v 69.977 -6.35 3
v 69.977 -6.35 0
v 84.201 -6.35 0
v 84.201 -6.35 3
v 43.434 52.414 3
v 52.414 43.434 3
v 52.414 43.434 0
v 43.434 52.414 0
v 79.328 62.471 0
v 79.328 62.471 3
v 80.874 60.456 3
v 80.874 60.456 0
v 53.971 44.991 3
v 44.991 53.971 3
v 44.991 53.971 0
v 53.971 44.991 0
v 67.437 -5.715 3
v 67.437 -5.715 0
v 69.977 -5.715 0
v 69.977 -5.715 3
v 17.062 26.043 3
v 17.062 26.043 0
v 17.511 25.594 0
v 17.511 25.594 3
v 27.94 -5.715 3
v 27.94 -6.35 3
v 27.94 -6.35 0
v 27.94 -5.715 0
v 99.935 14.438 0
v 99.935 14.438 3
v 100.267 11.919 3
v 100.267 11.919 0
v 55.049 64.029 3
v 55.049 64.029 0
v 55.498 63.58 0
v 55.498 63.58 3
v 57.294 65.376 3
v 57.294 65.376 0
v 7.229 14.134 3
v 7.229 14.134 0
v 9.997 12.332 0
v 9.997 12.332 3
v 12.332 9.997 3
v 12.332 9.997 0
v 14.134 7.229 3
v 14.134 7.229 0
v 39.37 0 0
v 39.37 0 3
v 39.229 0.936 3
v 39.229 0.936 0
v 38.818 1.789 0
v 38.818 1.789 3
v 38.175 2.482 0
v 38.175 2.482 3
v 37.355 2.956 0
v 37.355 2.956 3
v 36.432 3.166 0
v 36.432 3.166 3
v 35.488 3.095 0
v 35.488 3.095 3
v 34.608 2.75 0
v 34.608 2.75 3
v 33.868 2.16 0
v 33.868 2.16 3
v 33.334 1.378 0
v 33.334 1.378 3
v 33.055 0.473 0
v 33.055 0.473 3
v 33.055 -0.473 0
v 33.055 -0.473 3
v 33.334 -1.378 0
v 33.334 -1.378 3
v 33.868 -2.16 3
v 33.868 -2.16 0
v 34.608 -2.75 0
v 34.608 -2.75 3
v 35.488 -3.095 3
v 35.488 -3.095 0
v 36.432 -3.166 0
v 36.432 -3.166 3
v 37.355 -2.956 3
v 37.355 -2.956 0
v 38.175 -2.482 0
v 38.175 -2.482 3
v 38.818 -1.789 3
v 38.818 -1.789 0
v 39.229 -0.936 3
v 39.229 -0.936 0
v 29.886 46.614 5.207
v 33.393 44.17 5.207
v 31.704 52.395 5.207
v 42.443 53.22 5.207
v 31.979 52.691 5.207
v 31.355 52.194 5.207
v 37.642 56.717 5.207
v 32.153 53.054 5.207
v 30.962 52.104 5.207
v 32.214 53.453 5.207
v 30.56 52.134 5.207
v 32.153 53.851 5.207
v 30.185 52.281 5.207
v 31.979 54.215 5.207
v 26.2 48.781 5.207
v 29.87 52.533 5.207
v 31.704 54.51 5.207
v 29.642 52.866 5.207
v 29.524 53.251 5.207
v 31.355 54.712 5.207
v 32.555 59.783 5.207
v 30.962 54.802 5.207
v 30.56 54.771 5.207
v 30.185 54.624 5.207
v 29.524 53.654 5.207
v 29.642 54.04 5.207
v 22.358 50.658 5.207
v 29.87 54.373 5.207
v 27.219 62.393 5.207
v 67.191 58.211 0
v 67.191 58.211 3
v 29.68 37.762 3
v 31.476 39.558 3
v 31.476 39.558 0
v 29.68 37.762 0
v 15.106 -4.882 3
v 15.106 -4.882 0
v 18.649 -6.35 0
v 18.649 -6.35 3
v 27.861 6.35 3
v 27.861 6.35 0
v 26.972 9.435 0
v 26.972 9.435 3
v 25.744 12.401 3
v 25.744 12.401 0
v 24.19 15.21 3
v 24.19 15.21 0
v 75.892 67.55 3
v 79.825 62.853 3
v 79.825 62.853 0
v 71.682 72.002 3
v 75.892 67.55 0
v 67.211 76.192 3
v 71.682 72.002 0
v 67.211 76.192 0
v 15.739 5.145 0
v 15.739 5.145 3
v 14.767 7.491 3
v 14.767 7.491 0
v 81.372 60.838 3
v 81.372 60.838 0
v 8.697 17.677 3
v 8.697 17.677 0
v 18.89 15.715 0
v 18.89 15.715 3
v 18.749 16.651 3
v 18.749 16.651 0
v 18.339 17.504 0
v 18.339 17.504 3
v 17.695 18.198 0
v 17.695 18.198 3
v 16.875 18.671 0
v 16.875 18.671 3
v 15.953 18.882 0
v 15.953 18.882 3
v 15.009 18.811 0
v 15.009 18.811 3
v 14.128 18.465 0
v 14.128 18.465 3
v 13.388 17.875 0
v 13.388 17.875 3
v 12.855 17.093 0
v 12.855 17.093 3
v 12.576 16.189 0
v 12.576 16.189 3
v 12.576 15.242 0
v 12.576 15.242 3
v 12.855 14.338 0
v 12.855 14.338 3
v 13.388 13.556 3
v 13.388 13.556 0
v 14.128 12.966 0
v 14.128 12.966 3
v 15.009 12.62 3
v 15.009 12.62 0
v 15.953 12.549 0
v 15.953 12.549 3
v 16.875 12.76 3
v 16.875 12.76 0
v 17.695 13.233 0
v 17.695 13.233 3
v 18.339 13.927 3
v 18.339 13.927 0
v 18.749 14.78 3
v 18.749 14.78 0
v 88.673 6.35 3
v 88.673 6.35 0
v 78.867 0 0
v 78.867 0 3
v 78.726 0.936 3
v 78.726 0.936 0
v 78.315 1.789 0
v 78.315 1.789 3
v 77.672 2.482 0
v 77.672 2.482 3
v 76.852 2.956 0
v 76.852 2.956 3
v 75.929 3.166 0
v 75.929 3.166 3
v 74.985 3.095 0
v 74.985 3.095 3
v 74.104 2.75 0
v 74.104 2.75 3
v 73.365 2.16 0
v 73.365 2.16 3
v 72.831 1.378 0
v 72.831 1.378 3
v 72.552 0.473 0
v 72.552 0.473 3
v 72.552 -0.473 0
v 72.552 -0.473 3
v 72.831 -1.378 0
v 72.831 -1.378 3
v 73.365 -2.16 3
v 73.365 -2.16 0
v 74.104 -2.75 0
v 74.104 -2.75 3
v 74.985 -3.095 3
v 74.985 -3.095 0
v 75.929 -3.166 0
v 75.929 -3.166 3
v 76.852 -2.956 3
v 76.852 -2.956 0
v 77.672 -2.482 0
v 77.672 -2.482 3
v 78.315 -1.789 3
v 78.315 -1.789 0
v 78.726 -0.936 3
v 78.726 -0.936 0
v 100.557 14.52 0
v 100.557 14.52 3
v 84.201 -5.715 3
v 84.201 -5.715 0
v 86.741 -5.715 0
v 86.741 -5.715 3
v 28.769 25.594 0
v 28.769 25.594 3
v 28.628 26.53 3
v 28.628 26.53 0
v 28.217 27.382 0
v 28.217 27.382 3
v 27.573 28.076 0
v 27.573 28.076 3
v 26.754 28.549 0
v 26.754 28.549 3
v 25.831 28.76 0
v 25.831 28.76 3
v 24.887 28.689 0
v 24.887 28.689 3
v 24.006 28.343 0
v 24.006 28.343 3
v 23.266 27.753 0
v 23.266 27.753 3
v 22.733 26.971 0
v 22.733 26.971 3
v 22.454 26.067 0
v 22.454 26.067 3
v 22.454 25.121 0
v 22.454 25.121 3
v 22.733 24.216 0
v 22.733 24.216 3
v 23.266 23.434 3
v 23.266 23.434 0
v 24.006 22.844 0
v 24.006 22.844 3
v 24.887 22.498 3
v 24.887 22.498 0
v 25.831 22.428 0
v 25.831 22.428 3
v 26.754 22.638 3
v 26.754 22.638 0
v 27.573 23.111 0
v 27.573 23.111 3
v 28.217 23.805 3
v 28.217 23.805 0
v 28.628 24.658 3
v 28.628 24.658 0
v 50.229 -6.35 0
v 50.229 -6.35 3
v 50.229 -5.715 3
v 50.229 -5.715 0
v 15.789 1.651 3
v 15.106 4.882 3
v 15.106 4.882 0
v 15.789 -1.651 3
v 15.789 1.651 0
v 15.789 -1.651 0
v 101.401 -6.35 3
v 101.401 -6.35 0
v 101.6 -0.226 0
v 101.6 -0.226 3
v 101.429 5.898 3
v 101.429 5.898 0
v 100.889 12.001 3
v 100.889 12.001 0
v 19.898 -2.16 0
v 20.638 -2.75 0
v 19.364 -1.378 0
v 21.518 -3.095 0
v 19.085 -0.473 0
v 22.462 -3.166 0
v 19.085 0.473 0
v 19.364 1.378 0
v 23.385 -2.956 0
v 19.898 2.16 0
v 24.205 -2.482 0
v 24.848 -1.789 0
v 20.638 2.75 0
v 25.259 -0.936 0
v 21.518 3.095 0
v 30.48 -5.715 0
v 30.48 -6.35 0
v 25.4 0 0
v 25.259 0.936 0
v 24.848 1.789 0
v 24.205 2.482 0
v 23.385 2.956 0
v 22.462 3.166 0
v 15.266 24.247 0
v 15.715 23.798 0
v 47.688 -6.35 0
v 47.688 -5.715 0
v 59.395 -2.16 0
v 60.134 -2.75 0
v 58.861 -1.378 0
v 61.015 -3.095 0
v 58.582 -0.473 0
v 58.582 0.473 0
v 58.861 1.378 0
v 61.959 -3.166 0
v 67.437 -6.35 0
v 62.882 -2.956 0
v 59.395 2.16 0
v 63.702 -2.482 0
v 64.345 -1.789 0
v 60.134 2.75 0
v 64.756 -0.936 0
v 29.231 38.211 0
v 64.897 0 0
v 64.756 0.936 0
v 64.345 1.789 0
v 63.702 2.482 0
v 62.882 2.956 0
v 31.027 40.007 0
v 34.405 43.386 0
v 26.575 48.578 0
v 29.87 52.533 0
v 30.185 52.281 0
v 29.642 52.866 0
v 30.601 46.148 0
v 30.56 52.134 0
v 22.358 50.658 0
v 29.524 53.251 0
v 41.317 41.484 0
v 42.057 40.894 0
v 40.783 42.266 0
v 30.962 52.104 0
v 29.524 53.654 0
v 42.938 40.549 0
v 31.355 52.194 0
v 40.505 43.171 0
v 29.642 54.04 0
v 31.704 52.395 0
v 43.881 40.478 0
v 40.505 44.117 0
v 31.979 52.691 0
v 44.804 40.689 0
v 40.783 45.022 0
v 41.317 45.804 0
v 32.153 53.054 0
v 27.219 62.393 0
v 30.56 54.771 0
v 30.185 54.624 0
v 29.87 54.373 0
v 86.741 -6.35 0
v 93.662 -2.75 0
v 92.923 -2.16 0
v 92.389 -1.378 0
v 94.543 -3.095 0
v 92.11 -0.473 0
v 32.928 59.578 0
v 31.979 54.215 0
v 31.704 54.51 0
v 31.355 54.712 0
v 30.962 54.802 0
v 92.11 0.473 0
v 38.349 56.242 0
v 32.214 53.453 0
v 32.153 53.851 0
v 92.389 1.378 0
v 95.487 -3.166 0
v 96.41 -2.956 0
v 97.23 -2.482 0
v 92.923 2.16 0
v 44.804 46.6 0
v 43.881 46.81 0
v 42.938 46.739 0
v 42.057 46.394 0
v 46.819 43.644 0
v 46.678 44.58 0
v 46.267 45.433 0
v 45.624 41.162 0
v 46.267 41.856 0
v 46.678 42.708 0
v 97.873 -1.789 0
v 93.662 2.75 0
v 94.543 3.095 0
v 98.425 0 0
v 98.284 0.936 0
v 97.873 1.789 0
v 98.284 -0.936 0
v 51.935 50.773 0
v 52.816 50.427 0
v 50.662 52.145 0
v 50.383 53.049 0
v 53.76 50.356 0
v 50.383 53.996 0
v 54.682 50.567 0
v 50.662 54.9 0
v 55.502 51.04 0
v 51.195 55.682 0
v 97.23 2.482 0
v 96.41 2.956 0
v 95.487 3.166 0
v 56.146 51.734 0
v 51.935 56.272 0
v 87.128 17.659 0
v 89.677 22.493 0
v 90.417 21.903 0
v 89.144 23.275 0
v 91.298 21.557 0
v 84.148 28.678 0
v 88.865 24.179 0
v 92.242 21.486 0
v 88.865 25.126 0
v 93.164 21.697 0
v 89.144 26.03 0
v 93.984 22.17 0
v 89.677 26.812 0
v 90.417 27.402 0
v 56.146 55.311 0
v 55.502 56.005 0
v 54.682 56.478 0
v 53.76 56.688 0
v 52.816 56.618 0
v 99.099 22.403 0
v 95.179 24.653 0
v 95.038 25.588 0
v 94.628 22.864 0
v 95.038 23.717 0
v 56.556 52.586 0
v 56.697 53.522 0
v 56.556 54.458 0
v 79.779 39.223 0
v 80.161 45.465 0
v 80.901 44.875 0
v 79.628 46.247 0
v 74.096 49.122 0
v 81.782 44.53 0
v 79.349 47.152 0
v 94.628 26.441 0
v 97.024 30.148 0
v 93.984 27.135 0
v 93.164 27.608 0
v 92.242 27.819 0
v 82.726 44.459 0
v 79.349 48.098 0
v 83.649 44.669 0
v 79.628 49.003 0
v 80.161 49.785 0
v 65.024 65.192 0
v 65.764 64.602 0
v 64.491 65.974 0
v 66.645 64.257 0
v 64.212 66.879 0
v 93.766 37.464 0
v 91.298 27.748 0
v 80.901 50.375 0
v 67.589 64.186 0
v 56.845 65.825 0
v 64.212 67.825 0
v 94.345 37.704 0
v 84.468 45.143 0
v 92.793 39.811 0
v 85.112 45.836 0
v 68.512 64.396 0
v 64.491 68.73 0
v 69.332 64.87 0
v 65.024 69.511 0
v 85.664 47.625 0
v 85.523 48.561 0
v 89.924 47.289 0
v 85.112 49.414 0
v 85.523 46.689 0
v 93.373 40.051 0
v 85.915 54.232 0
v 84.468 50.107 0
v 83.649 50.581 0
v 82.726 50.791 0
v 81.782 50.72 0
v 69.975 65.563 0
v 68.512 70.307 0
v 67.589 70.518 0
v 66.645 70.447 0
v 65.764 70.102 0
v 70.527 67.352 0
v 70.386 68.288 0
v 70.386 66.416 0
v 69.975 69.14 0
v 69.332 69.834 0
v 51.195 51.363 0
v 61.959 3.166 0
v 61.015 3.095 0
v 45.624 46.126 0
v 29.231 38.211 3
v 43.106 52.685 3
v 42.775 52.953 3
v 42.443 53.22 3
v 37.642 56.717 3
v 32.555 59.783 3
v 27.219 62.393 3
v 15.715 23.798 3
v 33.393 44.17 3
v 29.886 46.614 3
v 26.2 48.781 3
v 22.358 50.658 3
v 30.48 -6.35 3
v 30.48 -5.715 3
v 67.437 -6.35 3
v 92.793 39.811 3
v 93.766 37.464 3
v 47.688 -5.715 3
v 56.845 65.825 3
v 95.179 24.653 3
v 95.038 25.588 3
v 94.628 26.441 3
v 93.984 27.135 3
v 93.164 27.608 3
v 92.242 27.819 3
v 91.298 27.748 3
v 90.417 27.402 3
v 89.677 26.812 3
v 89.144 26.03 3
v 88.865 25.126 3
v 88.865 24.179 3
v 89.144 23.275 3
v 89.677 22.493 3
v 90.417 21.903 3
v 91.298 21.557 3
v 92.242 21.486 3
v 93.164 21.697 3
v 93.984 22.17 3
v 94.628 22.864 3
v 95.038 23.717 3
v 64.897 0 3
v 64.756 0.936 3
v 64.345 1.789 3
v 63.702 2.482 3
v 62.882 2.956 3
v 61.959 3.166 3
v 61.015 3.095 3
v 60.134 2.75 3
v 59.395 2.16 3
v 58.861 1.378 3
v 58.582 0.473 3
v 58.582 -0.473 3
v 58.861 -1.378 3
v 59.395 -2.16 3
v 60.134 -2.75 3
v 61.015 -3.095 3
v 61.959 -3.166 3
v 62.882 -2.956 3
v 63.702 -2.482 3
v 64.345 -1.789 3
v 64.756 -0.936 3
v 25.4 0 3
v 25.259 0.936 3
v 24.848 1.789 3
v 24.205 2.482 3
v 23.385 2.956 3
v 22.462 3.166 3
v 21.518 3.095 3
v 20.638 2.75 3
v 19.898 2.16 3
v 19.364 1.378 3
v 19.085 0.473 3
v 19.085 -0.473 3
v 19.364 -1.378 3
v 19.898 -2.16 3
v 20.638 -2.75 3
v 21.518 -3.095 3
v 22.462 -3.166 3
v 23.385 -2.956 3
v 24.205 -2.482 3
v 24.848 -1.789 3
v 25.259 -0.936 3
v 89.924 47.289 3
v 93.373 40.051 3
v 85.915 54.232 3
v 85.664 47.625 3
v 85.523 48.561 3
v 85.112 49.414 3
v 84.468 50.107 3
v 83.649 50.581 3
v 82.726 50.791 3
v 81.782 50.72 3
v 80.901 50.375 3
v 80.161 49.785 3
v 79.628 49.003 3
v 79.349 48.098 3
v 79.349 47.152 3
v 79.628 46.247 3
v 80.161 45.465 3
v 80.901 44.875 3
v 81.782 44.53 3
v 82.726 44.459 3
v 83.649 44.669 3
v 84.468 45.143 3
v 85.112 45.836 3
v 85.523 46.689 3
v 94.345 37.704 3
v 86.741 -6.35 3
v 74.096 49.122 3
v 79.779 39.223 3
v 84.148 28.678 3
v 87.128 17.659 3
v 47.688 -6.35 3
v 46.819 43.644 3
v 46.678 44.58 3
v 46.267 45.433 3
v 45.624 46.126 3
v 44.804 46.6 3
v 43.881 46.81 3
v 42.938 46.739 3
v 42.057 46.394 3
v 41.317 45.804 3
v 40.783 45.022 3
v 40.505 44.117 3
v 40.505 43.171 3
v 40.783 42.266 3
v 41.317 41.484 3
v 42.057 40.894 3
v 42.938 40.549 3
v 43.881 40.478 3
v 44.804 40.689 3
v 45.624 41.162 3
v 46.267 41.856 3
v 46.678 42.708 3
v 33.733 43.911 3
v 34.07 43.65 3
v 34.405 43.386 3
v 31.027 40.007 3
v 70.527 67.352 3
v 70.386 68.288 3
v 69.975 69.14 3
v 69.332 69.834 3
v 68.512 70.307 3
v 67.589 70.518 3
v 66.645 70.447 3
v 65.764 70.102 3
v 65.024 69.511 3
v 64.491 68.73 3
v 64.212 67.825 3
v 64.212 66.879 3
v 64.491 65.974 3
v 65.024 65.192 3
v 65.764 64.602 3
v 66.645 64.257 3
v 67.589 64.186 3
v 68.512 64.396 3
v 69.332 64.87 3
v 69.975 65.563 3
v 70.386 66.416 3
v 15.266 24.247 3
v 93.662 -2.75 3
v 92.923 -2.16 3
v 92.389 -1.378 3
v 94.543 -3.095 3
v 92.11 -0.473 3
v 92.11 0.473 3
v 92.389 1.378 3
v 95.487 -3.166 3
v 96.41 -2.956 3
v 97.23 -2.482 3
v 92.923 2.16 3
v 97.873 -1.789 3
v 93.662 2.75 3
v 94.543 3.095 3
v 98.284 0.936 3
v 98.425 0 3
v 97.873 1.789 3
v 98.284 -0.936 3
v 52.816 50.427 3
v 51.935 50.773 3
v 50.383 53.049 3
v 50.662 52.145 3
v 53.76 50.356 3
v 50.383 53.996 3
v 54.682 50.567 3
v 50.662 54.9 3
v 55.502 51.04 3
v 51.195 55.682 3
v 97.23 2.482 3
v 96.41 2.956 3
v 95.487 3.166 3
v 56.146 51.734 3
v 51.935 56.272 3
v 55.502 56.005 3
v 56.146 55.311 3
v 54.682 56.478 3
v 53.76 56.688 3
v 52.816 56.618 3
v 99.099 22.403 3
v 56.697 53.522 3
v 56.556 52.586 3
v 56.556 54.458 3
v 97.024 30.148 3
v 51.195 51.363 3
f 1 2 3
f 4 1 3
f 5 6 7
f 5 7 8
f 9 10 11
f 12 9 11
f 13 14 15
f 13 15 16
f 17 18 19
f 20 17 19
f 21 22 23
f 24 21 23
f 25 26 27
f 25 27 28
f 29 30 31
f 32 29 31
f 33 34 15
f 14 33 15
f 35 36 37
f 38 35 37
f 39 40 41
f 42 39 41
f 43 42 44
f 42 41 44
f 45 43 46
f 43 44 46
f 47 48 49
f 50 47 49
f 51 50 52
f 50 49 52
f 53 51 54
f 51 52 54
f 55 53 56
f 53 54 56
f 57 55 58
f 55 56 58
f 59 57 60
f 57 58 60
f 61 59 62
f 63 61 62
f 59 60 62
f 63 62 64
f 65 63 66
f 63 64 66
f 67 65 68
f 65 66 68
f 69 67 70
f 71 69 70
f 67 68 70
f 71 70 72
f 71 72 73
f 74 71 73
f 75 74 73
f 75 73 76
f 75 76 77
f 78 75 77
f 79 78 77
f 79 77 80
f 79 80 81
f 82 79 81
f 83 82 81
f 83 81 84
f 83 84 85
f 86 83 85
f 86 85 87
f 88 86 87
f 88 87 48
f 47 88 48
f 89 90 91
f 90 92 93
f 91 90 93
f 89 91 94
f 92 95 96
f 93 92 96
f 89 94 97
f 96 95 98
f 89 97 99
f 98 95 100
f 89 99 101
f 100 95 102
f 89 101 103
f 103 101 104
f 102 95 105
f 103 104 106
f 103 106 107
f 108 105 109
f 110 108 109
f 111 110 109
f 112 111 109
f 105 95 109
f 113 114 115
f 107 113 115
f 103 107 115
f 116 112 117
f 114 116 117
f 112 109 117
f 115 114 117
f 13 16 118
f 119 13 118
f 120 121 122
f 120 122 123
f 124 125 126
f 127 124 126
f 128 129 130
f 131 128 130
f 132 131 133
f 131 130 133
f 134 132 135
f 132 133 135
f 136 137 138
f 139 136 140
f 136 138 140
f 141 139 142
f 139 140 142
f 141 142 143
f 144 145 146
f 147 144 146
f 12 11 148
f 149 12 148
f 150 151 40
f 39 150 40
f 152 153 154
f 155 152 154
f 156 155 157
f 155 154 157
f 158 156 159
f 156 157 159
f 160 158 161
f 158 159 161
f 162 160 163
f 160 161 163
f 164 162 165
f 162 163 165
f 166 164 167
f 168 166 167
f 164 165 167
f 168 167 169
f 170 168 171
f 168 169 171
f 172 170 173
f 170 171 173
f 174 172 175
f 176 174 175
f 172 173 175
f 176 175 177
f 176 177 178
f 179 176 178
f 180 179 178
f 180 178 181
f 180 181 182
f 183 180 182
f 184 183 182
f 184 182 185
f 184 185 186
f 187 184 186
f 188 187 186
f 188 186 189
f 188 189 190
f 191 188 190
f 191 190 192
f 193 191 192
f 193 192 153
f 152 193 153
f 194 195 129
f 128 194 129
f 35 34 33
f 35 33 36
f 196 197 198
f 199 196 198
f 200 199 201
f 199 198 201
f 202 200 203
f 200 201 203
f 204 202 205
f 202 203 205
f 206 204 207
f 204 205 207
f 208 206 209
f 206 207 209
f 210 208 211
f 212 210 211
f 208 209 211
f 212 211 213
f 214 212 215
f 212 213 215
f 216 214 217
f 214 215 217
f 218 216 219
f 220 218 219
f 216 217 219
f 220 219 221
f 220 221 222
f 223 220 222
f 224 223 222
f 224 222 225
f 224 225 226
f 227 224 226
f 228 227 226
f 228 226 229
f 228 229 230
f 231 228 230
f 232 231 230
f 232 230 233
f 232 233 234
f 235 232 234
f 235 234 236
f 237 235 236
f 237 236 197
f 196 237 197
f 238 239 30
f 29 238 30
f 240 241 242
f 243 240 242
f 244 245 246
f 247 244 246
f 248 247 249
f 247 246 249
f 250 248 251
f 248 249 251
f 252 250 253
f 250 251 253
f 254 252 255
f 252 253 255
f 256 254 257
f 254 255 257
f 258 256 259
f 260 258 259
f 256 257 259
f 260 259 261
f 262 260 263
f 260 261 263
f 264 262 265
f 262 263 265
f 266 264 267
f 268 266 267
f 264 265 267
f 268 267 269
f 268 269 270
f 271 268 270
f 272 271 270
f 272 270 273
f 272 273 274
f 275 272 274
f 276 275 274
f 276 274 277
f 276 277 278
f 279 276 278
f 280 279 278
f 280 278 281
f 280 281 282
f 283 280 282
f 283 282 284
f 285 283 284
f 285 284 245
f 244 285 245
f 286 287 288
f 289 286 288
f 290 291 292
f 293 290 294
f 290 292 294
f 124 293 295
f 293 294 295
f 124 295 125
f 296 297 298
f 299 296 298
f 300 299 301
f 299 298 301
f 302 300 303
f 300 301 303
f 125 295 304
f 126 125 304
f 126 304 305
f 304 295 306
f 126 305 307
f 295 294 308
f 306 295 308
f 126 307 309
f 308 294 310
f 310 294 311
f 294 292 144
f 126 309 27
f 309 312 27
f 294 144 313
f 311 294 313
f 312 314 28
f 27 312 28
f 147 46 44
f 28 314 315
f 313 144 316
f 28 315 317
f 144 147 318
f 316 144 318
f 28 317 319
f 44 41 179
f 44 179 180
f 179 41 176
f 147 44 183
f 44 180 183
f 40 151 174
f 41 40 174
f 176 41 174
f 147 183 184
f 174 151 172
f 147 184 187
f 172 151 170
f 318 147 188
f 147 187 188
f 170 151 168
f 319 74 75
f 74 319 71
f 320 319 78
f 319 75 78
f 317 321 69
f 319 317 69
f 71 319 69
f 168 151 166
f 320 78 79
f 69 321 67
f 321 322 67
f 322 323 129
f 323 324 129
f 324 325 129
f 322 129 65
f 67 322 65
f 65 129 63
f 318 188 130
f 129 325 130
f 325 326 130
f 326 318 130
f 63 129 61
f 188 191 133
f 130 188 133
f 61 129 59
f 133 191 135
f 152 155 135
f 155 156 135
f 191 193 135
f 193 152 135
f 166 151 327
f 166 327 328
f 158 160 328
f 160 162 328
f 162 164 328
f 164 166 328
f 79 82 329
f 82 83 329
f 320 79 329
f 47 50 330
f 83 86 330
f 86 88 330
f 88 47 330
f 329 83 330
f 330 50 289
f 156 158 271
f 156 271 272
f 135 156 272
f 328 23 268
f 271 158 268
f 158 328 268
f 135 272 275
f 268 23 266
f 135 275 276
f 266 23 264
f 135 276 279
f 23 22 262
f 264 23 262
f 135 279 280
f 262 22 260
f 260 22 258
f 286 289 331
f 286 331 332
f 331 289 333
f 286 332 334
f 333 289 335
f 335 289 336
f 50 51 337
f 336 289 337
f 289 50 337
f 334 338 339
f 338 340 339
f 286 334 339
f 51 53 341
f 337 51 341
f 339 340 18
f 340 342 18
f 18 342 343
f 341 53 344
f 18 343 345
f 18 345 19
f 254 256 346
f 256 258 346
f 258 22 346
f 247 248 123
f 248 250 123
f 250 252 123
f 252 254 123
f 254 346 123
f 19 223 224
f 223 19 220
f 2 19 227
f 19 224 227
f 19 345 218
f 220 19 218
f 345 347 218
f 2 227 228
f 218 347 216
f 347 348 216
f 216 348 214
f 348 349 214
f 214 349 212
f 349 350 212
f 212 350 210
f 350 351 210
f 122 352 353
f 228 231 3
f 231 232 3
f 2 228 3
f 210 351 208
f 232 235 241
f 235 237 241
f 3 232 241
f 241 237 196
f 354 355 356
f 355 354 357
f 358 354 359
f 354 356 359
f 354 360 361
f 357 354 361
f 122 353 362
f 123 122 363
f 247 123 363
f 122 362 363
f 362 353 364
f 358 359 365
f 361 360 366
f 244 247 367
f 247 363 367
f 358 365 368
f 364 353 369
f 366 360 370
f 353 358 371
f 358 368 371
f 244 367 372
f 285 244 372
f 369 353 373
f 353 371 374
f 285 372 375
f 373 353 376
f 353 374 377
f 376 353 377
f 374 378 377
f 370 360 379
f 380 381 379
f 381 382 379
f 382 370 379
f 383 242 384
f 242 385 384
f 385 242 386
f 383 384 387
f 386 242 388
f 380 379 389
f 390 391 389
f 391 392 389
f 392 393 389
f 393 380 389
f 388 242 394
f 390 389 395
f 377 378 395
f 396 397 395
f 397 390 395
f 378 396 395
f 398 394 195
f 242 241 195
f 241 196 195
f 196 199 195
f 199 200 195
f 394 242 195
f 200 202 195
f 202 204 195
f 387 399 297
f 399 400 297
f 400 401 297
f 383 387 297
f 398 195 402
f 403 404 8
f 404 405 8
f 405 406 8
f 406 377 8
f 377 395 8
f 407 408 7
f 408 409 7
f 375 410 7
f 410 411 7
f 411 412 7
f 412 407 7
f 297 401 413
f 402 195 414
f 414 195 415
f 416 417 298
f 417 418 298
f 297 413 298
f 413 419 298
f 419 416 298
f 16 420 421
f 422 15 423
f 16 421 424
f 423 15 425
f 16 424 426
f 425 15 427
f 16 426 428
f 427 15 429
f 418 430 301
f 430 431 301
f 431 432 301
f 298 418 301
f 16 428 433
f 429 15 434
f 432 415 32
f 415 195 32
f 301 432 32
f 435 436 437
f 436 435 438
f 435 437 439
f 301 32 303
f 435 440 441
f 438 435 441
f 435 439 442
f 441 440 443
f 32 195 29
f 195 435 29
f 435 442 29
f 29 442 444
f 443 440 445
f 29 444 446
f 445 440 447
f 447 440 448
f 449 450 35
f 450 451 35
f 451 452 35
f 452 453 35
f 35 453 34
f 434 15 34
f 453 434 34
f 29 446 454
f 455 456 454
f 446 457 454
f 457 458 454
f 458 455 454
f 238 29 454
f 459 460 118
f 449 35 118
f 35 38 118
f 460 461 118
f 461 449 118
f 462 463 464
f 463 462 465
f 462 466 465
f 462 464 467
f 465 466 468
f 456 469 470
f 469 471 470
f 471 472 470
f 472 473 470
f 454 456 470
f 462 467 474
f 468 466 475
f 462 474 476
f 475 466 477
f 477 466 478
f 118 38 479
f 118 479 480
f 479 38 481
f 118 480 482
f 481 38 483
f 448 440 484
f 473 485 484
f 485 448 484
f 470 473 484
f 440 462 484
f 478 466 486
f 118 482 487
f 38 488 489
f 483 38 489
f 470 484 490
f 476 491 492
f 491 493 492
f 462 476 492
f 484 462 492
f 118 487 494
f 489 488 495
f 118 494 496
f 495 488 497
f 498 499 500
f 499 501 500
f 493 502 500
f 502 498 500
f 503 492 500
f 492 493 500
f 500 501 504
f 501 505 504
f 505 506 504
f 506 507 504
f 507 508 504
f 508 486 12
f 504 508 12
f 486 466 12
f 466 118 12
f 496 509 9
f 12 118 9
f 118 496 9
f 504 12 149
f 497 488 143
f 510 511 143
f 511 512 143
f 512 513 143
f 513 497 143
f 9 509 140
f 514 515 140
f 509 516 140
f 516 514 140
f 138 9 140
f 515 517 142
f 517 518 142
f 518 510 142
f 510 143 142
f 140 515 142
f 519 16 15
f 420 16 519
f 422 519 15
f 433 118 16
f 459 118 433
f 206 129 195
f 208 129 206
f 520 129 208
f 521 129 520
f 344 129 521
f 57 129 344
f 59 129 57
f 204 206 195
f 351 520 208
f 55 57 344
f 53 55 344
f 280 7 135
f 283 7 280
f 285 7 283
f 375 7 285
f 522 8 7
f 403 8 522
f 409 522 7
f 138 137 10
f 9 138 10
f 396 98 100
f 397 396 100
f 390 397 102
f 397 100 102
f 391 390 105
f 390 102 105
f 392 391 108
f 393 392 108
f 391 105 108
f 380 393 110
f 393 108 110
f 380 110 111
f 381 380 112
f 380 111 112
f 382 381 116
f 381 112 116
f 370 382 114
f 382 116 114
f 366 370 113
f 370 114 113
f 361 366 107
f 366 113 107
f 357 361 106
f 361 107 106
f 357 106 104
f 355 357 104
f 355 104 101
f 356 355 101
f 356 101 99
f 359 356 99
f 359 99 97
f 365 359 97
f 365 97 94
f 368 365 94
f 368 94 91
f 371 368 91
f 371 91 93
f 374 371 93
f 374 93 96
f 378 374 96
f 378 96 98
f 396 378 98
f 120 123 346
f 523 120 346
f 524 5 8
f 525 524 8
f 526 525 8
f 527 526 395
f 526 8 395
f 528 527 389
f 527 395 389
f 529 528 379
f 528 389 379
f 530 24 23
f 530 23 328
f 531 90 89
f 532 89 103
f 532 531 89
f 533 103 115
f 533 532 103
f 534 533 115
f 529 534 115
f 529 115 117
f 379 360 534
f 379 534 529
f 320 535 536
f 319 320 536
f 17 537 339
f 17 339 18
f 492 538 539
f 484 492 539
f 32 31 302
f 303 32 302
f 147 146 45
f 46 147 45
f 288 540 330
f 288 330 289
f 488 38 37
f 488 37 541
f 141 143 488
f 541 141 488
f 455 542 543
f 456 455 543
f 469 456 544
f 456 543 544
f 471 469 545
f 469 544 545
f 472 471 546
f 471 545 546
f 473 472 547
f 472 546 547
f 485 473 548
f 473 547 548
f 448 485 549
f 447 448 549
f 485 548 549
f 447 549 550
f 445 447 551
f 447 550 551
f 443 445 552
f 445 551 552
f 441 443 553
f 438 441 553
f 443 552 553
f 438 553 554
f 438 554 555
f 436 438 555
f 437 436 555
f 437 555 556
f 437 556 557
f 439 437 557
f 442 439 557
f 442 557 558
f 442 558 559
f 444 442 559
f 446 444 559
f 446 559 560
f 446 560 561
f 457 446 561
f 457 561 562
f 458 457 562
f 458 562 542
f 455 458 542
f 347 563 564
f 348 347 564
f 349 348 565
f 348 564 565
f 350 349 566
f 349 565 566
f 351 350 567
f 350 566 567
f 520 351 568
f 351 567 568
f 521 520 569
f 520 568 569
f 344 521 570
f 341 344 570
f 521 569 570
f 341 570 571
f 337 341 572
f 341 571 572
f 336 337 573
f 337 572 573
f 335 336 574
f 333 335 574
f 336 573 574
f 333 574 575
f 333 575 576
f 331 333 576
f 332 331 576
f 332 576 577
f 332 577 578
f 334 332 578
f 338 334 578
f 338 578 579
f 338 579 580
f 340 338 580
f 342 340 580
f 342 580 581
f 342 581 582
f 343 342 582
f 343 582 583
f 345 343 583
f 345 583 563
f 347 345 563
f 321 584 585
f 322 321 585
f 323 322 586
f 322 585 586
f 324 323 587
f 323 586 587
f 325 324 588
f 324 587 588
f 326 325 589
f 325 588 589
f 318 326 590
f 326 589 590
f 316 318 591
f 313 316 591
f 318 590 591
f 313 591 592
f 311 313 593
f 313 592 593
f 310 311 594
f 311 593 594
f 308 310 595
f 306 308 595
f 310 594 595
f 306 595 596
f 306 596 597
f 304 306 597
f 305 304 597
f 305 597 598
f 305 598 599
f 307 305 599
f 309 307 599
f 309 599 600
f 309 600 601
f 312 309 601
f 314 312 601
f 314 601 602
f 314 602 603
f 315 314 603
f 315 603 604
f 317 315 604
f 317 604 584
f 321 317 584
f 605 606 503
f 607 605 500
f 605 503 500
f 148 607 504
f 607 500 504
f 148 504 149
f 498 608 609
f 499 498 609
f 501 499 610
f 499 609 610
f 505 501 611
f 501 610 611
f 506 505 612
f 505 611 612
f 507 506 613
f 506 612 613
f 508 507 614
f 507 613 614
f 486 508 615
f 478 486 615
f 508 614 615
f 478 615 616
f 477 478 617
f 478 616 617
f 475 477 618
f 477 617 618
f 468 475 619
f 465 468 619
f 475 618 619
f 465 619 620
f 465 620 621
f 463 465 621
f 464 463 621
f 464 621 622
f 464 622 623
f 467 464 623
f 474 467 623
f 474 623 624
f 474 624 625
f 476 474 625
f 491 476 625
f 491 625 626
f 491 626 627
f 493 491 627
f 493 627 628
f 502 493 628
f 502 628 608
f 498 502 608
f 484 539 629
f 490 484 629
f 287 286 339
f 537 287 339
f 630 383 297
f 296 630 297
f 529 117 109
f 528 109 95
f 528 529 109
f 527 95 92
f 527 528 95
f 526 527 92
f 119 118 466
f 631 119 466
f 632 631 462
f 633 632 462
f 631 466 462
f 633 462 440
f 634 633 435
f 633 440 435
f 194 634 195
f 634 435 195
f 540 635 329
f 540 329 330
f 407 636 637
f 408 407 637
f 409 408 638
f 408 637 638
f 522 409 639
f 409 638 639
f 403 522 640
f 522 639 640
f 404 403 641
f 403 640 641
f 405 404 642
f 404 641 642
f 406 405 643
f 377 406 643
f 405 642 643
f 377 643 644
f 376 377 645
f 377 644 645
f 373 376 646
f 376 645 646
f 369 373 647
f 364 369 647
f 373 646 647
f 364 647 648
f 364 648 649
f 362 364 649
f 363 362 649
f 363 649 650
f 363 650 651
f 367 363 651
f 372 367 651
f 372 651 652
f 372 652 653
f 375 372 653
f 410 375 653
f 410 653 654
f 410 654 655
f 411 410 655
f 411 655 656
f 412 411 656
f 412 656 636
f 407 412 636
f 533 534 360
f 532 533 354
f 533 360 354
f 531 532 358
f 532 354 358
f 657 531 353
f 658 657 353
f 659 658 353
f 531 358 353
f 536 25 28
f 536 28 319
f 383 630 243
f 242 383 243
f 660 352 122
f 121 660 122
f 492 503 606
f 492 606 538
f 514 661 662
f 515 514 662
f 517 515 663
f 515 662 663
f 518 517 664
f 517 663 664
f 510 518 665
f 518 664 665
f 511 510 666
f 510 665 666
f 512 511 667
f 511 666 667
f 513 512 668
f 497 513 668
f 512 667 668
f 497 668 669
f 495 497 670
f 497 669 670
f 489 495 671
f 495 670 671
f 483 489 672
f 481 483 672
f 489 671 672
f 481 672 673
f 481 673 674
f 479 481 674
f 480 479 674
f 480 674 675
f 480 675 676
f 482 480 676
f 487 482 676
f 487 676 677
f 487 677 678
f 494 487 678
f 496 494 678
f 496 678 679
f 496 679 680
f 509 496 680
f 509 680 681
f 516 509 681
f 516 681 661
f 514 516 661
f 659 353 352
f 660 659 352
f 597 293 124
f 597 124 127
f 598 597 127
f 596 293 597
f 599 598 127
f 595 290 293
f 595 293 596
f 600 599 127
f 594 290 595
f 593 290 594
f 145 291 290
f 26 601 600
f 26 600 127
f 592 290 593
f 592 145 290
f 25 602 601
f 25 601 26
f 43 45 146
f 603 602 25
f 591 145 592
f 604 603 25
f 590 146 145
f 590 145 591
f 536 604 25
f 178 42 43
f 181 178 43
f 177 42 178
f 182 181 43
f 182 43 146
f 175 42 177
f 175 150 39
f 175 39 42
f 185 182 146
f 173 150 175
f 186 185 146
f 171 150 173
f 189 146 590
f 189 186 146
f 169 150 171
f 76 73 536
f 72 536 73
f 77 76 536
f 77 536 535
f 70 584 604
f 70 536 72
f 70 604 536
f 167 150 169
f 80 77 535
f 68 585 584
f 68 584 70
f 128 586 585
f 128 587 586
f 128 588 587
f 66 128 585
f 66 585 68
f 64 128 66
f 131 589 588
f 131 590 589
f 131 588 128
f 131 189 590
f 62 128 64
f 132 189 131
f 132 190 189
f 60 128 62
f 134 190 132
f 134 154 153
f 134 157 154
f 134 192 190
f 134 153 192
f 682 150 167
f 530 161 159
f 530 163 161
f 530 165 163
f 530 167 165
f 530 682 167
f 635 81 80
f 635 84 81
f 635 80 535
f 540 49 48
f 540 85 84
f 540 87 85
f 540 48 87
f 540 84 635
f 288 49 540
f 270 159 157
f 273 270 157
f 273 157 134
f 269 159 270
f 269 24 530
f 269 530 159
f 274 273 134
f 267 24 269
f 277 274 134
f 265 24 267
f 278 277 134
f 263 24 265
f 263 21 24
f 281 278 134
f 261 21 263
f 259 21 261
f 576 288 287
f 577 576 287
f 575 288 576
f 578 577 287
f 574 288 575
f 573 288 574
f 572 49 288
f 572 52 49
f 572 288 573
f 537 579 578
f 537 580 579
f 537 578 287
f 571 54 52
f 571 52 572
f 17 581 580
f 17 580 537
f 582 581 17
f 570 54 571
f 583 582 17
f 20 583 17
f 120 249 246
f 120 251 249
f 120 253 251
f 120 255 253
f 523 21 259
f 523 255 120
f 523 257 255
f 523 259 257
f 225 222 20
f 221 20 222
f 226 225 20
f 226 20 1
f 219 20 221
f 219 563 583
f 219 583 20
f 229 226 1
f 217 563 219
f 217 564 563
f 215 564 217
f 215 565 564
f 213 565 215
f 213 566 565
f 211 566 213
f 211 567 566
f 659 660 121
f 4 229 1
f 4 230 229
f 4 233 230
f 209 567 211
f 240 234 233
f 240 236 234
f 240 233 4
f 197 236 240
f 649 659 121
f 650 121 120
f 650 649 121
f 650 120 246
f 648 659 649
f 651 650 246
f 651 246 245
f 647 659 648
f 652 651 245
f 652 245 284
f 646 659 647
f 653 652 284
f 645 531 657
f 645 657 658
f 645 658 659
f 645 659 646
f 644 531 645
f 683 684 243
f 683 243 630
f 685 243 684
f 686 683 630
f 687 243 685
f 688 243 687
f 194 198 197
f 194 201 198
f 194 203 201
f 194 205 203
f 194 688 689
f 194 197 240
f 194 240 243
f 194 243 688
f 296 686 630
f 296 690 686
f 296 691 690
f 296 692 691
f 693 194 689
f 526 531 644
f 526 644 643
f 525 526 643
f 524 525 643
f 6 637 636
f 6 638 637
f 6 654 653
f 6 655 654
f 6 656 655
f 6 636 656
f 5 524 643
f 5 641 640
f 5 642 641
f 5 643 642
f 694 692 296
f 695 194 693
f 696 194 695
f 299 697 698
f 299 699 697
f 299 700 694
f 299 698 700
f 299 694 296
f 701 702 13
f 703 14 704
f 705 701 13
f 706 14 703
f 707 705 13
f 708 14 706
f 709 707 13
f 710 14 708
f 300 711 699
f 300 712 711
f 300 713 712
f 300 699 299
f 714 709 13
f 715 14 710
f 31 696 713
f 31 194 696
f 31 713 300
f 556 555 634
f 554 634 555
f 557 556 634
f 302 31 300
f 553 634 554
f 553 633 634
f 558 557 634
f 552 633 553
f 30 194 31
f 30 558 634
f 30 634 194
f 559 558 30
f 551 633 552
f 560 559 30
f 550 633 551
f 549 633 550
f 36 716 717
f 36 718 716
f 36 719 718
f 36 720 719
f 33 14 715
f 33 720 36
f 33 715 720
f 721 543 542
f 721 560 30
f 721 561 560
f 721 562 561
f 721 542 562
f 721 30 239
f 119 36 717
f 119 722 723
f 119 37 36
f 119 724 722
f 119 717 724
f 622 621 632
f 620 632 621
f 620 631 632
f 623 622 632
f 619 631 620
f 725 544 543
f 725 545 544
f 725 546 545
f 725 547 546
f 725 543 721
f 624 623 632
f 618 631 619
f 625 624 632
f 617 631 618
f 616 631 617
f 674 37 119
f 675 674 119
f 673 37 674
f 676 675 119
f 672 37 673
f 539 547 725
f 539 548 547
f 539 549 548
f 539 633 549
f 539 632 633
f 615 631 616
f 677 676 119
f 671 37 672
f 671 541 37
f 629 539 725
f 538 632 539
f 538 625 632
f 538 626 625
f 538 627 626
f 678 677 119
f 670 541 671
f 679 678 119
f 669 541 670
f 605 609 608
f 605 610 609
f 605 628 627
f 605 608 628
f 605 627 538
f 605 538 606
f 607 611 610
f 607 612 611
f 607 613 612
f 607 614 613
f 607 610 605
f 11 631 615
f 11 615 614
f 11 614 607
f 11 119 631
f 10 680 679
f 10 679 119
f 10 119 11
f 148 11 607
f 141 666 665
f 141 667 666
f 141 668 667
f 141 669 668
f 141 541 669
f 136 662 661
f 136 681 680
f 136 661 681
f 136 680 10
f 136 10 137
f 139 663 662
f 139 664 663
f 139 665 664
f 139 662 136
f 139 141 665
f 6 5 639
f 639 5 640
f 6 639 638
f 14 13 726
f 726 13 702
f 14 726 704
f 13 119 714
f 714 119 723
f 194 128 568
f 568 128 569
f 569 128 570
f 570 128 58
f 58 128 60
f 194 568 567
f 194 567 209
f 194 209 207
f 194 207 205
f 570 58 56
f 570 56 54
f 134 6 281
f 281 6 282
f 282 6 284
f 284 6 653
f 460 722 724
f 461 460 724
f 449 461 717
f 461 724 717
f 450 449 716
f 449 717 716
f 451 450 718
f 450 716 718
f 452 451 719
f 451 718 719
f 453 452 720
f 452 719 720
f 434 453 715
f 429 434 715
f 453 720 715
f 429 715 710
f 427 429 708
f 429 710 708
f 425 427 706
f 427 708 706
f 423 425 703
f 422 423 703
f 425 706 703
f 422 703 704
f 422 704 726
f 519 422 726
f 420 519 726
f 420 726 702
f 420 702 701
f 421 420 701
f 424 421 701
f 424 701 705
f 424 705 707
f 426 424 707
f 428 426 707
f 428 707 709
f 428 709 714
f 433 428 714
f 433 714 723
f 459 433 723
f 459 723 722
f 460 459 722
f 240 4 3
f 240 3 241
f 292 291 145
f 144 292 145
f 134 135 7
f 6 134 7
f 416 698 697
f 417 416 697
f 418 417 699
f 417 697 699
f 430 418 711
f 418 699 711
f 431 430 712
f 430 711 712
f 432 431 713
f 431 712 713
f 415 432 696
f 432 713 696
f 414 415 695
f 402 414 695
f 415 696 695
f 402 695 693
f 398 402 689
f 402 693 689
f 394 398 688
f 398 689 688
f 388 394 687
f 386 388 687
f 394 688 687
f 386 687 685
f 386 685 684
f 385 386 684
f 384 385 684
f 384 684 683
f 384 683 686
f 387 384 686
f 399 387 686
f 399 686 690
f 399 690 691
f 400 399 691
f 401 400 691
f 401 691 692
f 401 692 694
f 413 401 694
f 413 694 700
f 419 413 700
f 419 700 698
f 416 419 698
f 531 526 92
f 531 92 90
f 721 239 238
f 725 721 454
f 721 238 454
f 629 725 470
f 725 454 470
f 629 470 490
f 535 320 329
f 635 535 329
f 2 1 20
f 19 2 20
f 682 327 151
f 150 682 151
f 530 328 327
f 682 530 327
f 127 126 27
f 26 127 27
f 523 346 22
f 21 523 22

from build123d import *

# Parameters (mm, degrees)
BOSS_EXTRUDE1_DEPTH   = 3.000000096
SKETCH2_R             = 3.175
CUT_EXTRUDE1_DEPTH    = 4.000000096
SKETCH3_W             = 2.54
SKETCH3_H             = 0.635
CUT_EXTRUDE2_DEPTH    = 4.000000096
BOSS_EXTRUDE2_DEPTH   = 2.206999904
F_6_32_TAPPED_HOLE1_D = 2.7051


with BuildPart() as part:
    # Sketch1 → Boss-Extrude1 (new body)
    with BuildSketch(Plane.XY):
        with BuildLine():
            Line((27.218819563, 62.393373411), (22.357699804, 50.65759216))
            ThreePointArc((22.357699804, 50.65759216), (28.61353693, 47.405947816), (34.405475059, 43.38573118))
            Line((34.405475059, 43.38573118), (8.696654013, 17.676910134))
            Line((8.696654013, 17.676910134), (7.228954972, 14.133571205))
            ThreePointArc((7.228954972, 14.133571205), (14.666587579, 6.075099489), (15.105587123, -4.88230096))
            Line((15.105587123, -4.88230096), (18.648926052, -6.35))
            Line((18.648926052, -6.35), (101.401368334, -6.35))
            ThreePointArc((101.401368334, -6.35), (93.866160503, 38.880636728), (67.21146711, 76.191723231))
            Line((67.21146711, 76.191723231), (43.43415954, 52.414415661))
            ThreePointArc((43.43415954, 52.414415661), (35.677104191, 57.973626939), (27.218819563, 62.393373411))
        make_face()
        with BuildLine():
            Line((88.672924278, 6.35), (27.86051193, 6.35))
            ThreePointArc((27.86051193, 6.35), (26.399857642, 10.93517908), (24.190484974, 15.210228852))
            Line((24.190484974, 15.210228852), (67.191354125, 58.211098004))
            ThreePointArc((67.191354125, 58.211098004), (82.13289044, 34.020557137), (88.672924278, 6.35))
        make_face(mode=Mode.SUBTRACT)
    extrude(amount=BOSS_EXTRUDE1_DEPTH)

    # Sketch2 → Cut-Extrude1 (cut, through all)
    with BuildSketch(Plane.XY.offset(3.000000096)):
        with Locations((22.225, 0)):
            Circle(SKETCH2_R)
        with Locations((36.195, 0)):
            Circle(SKETCH2_R)
        with Locations((61.722, 0)):
            Circle(SKETCH2_R)
        with Locations((75.692, 0)):
            Circle(SKETCH2_R)
        with Locations((95.25, 0)):
            Circle(SKETCH2_R)
        with Locations((15.715448212, 15.715448212)):
            Circle(SKETCH2_R)
        with Locations((25.593729945, 25.593729945)):
            Circle(SKETCH2_R)
        with Locations((43.644044748, 43.644044748)):
            Circle(SKETCH2_R)
        with Locations((53.522326482, 53.522326482)):
            Circle(SKETCH2_R)
        with Locations((92.004434954, 24.652514046)):
            Circle(SKETCH2_R)
        with Locations((82.48891971, 47.625)):
            Circle(SKETCH2_R)
        with Locations((67.351920908, 67.351920908)):
            Circle(SKETCH2_R)
    extrude(amount=-CUT_EXTRUDE1_DEPTH, mode=Mode.SUBTRACT)

    # Sketch3 → Cut-Extrude2 (cut, through all)
    with BuildSketch(Plane.XY.offset(3.000000096)):
        Polygon((15.266435406, 24.246691527), (17.06248663, 26.042742751), (17.511499436, 25.593729945), (15.715448212, 23.797678721), align=None)
        Polygon((43.43415954, 52.414415661), (44.991083167, 53.971339288), (53.971339288, 44.991083167), (52.414415661, 43.43415954), align=None)
        with Locations((29.21, -6.0325)):
            Rectangle(SKETCH3_W, SKETCH3_H)
        with Locations((68.707, -6.0325)):
            Rectangle(SKETCH3_W, SKETCH3_H)
        Polygon((29.230733674, 38.210989795), (31.026784898, 40.007041019), (31.475797704, 39.558028213), (29.67974648, 37.761976989), align=None)
        Polygon((56.845021246, 65.825277367), (55.048970022, 64.029226143), (55.497982828, 63.580213337), (57.294034052, 65.376264561), align=None)
        with Locations((48.9585, -6.0325)):
            Rectangle(SKETCH3_W, SKETCH3_H)
        with Locations((85.471, -6.0325)):
            Rectangle(SKETCH3_W, SKETCH3_H)
        Polygon((99.935462164, 14.437711971), (100.266998693, 11.919442024), (101.526133667, 12.085210288), (101.194597138, 14.603480236), align=None)
        Polygon((93.765504959, 37.464305742), (94.938831965, 37.950313702), (93.966816047, 40.296967714), (92.793489041, 39.810959755), align=None)
        Polygon((79.327792988, 62.471156422), (80.874047017, 60.456038938), (81.88160576, 61.229165953), (80.33535173, 63.244283437), align=None)
        Polygon((13.593916116, 7.005422516), (14.565932035, 4.658768503), (15.739259041, 5.144776462), (14.767243123, 7.491430475), align=None)
    extrude(amount=-CUT_EXTRUDE2_DEPTH, mode=Mode.SUBTRACT)

    # Sketch4 → Boss-Extrude2 (add)
    with BuildSketch(Plane.XY.offset(3.000000096)):
        with BuildLine():
            Line((22.357699804, 50.65759216), (27.218819563, 62.393373411))
            ThreePointArc((27.218819563, 62.393373411), (35.13186657, 58.305652688), (42.443492672, 53.219800017))
            Line((42.443492672, 53.219800017), (33.393246405, 44.169553751))
            ThreePointArc((33.393246405, 44.169553751), (28.063600293, 47.73355971), (22.357699804, 50.65759216))
        make_face()
    extrude(amount=BOSS_EXTRUDE2_DEPTH)

    # #6-32 Tapped Hole1 (through all)
    with Locations(Plane(origin=(0, 0, 0), x_dir=(-1, 0, 0), z_dir=(0, 0, -1))):
        with Locations((-30.861, 53.452819972)):
            Hole(F_6_32_TAPPED_HOLE1_D / 2)


solid = part.part
